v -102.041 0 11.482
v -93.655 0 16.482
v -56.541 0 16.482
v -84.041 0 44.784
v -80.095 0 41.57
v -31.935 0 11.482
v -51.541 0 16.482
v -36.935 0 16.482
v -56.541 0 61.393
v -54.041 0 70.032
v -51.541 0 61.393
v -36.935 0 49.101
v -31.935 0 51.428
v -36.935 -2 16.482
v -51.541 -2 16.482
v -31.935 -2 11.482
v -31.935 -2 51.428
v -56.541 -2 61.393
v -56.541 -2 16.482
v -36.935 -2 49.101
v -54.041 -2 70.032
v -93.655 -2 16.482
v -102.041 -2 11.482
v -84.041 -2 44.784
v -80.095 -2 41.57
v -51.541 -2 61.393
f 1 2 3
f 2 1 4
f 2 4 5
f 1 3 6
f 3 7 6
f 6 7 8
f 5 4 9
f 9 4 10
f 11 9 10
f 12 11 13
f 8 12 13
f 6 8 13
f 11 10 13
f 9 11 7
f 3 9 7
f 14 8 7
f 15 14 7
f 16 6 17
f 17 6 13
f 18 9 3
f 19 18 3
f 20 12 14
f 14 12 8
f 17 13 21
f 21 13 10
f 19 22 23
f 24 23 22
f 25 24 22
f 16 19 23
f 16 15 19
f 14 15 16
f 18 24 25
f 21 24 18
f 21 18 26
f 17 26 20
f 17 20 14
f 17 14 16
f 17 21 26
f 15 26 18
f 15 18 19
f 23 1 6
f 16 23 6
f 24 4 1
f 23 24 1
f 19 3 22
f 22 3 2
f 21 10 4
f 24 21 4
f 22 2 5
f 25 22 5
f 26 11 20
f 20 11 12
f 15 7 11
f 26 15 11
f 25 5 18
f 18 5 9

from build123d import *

# Parameters (mm, degrees)
F1_DEPTH = 2


with BuildPart() as f1:
    # F0 (on Front) → F1 (new body)
    with BuildSketch(Plane.XZ):
        Polygon((-31.935285, 51.427654), (-54.041285, 70.032309), (-84.041285, 44.783976), (-102.041285, 11.482309), (-31.935285, 11.482309), align=None)
        Polygon((-56.541285, 16.482309), (-93.655068, 16.482309), (-80.094596, 41.570438), (-56.541285, 61.393166), align=None, mode=Mode.SUBTRACT)
        Polygon((-36.935285, 49.100595), (-36.935285, 16.482309), (-51.541285, 16.482309), (-51.541285, 61.393166), align=None, mode=Mode.SUBTRACT)
    extrude(amount=F1_DEPTH)


solid = f1.part
